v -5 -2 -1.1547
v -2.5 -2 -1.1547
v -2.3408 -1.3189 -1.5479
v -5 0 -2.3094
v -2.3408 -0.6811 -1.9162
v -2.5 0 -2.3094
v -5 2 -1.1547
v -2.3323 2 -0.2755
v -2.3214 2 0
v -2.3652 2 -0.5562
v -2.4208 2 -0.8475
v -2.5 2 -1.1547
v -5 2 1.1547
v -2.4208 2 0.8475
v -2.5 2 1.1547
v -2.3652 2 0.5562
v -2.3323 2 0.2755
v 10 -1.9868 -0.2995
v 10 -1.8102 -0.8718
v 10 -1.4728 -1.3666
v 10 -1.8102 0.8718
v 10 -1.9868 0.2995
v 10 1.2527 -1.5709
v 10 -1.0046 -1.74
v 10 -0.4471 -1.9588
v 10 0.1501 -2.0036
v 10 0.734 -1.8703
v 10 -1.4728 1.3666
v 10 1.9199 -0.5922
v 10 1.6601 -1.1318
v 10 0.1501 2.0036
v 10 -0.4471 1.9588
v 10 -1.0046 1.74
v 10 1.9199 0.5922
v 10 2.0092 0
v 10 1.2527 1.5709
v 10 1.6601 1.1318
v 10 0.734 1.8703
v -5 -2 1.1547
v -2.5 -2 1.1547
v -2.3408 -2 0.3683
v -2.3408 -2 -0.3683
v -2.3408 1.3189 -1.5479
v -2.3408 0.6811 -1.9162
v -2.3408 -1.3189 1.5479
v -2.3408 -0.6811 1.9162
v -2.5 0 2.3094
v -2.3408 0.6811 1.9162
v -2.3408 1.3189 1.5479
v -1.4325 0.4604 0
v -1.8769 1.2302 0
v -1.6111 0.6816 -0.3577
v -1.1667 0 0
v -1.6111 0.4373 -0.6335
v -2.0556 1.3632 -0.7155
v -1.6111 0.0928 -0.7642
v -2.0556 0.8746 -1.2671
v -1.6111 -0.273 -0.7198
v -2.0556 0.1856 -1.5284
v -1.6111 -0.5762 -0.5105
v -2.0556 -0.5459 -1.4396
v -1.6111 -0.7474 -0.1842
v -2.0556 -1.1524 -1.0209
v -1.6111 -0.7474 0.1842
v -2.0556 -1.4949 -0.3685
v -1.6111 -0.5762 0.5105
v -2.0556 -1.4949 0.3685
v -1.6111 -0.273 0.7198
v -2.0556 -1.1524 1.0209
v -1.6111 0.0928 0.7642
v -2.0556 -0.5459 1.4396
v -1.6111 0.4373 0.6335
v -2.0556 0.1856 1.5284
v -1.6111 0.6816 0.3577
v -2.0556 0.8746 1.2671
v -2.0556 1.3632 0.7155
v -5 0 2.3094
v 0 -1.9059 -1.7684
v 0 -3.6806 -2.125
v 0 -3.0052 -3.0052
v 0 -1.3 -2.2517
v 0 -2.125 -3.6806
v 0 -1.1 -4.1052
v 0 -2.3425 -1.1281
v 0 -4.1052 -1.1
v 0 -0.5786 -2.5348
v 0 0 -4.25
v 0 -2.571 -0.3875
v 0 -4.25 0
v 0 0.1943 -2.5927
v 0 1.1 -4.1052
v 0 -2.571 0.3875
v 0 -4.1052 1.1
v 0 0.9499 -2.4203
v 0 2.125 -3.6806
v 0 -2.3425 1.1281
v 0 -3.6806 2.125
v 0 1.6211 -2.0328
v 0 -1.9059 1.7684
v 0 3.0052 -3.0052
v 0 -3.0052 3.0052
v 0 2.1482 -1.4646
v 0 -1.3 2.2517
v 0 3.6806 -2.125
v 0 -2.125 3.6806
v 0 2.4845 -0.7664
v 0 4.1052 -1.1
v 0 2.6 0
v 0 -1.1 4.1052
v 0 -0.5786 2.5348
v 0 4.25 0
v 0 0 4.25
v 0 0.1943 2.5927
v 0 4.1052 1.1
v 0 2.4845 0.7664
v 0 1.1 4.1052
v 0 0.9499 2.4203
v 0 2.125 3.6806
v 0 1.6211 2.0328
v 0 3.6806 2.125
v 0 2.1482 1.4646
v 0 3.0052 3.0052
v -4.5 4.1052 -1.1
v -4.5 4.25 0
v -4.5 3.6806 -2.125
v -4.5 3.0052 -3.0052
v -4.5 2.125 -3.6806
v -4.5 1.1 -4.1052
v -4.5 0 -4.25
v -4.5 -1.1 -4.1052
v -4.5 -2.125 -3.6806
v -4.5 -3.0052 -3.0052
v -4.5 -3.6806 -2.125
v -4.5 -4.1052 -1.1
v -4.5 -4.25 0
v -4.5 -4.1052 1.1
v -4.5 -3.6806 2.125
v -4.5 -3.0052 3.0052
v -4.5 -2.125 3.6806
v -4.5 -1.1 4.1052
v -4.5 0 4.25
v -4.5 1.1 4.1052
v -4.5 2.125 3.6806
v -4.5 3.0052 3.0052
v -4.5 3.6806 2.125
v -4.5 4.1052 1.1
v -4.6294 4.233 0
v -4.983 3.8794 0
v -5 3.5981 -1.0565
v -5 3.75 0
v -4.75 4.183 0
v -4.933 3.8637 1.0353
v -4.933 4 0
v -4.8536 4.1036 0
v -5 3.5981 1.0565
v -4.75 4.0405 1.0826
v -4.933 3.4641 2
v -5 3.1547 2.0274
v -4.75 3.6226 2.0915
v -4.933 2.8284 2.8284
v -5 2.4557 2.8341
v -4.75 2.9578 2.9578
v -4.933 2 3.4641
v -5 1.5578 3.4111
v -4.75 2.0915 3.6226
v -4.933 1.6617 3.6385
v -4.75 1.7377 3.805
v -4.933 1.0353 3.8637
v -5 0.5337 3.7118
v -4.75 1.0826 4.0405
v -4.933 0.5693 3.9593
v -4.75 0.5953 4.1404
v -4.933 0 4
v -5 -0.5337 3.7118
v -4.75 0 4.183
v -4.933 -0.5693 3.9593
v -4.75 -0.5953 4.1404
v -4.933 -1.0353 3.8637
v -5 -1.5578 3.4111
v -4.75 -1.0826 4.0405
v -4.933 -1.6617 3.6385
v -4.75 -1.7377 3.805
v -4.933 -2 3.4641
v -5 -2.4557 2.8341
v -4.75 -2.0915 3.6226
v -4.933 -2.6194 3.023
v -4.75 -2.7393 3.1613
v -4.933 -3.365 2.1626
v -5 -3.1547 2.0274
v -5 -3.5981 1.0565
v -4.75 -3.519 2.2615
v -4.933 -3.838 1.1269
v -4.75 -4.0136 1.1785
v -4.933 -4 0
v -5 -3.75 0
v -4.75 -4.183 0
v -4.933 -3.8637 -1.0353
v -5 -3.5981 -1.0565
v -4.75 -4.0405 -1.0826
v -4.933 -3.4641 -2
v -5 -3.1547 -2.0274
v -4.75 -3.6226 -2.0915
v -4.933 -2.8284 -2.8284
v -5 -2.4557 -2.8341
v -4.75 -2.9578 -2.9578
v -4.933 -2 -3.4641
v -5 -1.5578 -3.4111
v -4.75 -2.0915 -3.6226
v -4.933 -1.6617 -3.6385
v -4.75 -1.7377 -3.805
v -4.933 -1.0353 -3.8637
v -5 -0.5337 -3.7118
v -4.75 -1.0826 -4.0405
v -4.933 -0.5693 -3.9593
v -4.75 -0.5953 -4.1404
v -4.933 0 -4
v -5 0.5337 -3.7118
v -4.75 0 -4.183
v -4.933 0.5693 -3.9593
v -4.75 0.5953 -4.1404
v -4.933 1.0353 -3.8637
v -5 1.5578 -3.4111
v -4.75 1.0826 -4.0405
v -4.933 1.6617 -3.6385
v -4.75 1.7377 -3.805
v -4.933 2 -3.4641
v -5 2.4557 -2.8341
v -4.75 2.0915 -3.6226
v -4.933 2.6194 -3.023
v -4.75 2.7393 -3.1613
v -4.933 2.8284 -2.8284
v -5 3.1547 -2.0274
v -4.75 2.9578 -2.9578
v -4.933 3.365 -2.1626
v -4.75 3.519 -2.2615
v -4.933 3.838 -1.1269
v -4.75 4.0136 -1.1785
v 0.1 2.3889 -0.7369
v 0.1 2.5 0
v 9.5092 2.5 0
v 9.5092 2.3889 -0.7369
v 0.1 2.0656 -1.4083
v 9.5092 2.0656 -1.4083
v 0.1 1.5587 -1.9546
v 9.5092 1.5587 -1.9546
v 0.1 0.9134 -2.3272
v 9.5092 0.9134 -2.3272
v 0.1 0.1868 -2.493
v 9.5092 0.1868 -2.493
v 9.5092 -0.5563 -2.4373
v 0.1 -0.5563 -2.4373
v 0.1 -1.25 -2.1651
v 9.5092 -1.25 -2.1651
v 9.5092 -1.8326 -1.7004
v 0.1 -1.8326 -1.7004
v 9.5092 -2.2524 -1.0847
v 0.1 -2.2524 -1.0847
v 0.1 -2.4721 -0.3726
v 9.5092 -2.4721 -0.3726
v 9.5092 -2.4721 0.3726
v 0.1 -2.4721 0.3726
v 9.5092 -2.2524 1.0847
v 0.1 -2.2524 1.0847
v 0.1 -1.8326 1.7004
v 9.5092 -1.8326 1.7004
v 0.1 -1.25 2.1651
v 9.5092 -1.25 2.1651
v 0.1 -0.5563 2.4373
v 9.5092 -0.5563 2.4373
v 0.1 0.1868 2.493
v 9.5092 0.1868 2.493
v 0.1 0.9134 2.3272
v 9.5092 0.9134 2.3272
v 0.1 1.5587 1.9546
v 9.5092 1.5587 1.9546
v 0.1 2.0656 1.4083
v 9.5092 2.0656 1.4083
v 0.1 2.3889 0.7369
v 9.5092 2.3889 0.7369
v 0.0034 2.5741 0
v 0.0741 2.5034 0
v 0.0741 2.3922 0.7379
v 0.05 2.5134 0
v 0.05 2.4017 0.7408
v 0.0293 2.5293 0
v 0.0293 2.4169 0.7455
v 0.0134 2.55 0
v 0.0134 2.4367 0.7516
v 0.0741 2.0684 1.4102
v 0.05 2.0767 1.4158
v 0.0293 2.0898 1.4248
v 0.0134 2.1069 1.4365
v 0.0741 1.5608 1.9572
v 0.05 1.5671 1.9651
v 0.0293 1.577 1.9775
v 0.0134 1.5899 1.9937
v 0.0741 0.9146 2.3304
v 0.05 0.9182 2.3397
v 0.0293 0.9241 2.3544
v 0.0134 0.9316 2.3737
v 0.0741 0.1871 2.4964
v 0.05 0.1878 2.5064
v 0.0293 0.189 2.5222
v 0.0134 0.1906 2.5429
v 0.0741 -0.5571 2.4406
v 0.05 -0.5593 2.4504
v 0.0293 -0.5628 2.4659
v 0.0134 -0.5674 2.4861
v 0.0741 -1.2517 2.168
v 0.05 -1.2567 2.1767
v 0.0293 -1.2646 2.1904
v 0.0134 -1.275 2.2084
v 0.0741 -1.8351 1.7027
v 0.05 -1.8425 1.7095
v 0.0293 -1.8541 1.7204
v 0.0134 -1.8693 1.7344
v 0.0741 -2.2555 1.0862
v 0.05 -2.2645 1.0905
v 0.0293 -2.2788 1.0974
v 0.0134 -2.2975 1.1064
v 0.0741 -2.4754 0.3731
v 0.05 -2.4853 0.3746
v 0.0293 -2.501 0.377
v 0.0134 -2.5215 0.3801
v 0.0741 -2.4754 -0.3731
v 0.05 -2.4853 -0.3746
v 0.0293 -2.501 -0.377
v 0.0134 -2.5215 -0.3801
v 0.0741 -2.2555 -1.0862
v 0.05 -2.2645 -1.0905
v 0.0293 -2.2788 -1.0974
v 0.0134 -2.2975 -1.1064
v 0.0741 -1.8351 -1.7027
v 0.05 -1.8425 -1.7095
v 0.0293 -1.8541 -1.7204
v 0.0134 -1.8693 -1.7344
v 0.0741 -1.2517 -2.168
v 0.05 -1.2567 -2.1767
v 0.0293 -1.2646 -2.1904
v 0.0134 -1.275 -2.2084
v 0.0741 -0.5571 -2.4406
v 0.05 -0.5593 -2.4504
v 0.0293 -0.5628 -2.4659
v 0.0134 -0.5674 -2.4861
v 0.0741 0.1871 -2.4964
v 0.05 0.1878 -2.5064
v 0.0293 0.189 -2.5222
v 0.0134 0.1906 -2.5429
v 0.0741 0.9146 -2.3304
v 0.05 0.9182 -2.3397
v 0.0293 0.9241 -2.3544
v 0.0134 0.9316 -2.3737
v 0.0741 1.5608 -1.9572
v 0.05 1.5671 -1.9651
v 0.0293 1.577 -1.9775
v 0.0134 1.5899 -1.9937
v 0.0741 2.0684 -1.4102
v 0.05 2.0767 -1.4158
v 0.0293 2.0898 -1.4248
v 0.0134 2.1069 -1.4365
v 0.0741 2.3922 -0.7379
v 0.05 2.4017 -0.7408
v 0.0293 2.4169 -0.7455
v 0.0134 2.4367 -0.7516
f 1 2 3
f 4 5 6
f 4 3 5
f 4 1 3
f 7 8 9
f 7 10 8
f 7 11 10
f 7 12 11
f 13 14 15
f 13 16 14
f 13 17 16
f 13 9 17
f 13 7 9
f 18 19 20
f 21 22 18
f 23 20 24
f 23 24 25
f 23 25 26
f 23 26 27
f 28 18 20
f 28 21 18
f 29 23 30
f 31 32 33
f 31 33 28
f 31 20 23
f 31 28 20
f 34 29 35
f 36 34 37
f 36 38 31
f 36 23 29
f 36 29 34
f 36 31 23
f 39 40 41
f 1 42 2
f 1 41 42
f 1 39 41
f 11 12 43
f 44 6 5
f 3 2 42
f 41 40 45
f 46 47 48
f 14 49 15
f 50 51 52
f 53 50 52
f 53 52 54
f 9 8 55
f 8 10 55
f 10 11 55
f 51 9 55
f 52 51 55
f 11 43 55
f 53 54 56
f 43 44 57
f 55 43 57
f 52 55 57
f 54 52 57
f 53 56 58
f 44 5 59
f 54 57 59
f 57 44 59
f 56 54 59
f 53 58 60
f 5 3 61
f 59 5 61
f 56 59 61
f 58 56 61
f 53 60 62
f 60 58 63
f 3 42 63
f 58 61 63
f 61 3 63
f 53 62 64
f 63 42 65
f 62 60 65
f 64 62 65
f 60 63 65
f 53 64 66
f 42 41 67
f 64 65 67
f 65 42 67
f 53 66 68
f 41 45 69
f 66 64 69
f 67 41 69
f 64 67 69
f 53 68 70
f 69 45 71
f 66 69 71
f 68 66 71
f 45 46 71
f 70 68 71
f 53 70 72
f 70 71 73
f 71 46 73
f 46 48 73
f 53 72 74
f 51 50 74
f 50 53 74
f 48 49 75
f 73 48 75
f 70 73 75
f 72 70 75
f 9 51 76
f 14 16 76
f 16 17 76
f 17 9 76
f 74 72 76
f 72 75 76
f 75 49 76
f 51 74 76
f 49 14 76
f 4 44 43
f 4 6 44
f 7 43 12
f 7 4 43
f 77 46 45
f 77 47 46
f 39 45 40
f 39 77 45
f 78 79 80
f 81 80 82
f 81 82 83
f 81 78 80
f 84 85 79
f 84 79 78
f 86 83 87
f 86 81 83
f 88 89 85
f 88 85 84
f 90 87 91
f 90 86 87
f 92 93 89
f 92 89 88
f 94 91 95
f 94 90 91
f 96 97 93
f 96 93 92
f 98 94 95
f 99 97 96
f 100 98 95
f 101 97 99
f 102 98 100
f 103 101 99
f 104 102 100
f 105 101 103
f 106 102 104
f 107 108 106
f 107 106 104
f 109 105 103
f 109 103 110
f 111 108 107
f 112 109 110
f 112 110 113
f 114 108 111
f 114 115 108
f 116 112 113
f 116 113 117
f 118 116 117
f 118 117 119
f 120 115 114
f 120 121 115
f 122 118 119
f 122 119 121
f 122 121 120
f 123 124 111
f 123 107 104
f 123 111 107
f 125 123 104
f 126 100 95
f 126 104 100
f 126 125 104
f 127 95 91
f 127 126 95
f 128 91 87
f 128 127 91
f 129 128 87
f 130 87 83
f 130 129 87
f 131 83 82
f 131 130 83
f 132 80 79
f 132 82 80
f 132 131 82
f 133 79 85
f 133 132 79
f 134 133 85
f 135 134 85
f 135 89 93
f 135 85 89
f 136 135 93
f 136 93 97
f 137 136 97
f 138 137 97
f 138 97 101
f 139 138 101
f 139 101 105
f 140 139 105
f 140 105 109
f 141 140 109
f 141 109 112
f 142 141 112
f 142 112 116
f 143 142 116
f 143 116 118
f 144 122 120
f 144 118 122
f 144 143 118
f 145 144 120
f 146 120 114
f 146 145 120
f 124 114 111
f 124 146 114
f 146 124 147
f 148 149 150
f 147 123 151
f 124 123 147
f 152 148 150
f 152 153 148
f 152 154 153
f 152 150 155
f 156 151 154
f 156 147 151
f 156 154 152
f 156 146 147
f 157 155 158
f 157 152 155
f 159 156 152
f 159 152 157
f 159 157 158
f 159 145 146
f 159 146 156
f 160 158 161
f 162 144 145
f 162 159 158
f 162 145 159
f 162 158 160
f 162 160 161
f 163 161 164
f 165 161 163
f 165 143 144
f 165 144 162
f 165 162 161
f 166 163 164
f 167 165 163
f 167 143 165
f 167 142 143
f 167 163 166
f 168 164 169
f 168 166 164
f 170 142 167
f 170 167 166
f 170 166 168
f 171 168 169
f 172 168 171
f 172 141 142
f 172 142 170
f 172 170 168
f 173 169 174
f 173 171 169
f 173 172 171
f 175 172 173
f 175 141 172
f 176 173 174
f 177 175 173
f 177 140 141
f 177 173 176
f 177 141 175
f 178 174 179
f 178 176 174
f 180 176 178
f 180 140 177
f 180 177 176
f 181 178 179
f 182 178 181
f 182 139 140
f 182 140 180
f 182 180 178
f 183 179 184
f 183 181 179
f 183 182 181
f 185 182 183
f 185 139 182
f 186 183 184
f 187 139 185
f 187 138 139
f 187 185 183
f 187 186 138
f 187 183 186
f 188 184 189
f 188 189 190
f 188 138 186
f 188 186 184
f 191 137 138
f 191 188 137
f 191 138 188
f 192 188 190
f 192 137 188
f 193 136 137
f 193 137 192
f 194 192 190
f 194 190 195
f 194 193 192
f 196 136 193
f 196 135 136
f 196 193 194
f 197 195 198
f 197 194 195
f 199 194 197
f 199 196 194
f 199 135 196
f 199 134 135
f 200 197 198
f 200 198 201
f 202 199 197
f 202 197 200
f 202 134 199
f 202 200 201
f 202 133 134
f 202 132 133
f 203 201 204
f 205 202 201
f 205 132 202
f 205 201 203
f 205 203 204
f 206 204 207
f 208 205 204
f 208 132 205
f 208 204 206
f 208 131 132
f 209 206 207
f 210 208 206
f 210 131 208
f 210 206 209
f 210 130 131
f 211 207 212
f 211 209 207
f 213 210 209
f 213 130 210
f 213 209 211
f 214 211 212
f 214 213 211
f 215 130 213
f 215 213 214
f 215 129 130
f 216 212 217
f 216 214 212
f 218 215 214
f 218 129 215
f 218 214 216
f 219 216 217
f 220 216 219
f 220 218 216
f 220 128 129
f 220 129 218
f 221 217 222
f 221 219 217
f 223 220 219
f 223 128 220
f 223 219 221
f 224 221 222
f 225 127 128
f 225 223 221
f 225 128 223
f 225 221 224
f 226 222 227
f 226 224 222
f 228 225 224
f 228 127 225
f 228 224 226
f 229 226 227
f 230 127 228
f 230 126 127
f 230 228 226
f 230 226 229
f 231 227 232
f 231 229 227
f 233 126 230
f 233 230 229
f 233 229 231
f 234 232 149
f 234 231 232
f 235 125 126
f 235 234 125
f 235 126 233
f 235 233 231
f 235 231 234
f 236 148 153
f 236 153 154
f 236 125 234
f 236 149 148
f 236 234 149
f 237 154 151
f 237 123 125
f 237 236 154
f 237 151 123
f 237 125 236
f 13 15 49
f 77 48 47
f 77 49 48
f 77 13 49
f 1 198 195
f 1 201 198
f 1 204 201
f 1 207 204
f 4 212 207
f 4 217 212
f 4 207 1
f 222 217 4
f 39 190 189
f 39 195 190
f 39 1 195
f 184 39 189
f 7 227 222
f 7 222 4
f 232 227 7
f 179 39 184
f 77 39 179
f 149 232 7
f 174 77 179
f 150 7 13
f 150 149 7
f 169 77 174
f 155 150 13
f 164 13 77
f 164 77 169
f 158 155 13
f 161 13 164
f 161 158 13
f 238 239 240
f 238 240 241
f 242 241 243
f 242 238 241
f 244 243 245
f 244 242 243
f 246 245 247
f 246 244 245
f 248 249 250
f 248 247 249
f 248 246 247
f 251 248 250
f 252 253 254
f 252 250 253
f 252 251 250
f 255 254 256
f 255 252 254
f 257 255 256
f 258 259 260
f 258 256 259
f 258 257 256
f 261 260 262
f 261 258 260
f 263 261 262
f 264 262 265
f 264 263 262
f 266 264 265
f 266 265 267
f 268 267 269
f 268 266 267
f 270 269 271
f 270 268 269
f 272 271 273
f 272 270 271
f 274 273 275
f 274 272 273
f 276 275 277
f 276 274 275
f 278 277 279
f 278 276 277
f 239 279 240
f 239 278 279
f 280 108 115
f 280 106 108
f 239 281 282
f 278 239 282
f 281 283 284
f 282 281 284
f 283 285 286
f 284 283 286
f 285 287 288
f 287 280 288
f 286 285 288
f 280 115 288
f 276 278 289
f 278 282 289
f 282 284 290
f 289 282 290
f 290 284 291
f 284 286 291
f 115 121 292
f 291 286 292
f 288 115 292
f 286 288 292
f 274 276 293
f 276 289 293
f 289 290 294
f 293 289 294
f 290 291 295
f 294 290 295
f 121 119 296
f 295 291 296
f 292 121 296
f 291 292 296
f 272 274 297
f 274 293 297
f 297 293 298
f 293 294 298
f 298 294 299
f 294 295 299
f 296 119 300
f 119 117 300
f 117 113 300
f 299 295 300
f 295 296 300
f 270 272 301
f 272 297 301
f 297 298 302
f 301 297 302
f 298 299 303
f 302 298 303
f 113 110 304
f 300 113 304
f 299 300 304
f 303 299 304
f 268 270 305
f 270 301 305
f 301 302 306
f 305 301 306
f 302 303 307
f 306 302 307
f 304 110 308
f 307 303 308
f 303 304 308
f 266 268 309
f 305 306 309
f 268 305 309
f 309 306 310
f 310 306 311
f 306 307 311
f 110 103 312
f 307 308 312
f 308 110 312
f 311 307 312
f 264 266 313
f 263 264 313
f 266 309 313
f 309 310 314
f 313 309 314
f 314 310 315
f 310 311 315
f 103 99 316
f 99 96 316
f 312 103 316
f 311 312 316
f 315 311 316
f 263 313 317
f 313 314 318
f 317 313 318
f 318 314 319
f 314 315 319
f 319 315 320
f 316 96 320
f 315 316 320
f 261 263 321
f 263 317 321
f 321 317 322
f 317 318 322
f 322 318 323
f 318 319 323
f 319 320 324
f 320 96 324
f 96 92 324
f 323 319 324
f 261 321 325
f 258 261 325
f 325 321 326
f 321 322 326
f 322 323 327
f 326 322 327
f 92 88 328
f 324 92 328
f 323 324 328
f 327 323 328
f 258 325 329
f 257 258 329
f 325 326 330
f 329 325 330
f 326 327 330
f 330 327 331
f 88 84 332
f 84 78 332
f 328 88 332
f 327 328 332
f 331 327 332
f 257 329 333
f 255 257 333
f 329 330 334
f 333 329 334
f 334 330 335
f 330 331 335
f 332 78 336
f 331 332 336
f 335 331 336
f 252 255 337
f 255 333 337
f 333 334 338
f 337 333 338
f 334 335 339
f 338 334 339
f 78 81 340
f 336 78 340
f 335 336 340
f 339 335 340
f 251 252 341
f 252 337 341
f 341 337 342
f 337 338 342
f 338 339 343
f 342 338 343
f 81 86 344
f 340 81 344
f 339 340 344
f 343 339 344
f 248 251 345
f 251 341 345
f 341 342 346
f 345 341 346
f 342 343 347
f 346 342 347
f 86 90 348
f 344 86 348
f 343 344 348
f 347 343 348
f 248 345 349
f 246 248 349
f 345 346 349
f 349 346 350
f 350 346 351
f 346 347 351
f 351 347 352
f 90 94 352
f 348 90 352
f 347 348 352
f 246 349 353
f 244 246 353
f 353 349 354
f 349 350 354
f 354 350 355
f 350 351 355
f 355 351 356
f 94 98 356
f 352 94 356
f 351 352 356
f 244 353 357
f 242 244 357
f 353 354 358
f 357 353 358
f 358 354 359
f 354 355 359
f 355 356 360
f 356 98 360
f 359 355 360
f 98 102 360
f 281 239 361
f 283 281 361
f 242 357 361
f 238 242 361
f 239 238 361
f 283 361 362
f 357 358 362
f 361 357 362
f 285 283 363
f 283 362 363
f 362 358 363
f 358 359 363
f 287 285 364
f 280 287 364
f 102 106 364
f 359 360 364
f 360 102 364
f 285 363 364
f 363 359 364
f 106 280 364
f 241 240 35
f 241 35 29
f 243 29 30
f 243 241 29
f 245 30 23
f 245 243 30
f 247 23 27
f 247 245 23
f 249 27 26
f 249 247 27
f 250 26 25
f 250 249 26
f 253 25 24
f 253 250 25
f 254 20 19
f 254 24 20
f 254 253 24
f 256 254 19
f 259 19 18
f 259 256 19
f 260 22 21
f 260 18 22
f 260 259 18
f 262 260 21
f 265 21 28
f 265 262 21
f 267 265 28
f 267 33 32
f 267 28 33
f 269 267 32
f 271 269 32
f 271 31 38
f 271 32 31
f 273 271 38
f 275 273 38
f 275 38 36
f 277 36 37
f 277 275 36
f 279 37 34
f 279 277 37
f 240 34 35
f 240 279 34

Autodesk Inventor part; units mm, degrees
ref_plane "YZ Plane" through (0, 0, 0) normal (1, 0, 0) x (0, 1, 0)
ref_plane "XZ Plane" through (0, 0, 0) normal (0, 1, 0) x (-1, 0, 0)
sketch "Szkic1" plane through (0, 0, 0) normal (0, 0, 1) x (1, 0, 0)
  line L0 (-1.1667, 0) -> (10, 0)
  line L1 (10, 0) -> (10, 2.5)
  line L2 (10, 2.5) -> (2, 2.5)
  line L3 (2, 2.5) -> (1.5091, 2.5)
  line L4 (1.5091, 2.5) -> (0, 2.5)
  line L5 (0, 2.5) -> (0, 4.25)
  line L6 (0, 4.25) -> (-5, 4.25)
  line L7 (-5, 4.25) -> (-5, 2.3094)
  line L8 (-5, 2.3094) -> (-2.5, 2.3094)
  line L9 (-2.5, 2.3094) -> (-1.1667, 0)
  line L10 (-8, 0) -> (13, 0) projected
  line L11 (0, -0.85) -> (0, 5.1) projected
  line L12 (2, 2.5) -> (0, 2.5) construction
  dimension "d1" = 8
  dimension "d2" = 0.4909
  dimension "d3" = 5
  dimension "d4" = 2.5
  dimension "d5" = 60
  dimension "d6" = 5
  dimension "d7" = 5
  dimension "d8" = 4.6188
  dimension "d9" = 8.5
  dimension "d26" = 10
revolve "Bryła" add sketch "Szkic1" angle 360 about axis through (-1.1667, 0, 0) along (1, 0, 0)
sketch "Szkic2" plane through (-5, 0, 0) normal (-1, 0, 0) x (0, 0, 1)
  circle A0 centre (0, 0) radius 2.3094 projected
  line L0 (0, -5.95) -> (0, 5.95) projected
  line L1 (-5.95, 0) -> (5.95, 0) projected
  line L2 (2.3094, 0) -> (1.1547, -2)
  line L3 (1.1547, -2) -> (-1.1547, -2)
  line L4 (-1.1547, -2) -> (-2.3094, 0)
  line L5 (-2.3094, 0) -> (-1.1547, 2)
  line L6 (-1.1547, 2) -> (1.1547, 2)
  line L7 (1.1547, 2) -> (2.3094, 0)
extrude "Szczelina" add sketch "Szkic2" against normal up to next contours L7 A0 | A0 L2 | L6 L0 A0 | A0 L0 L3 | L0 L6 A0 | A0 L3 L0 | L4 A0 | A0 L5
fillet "Zaokrąglenie1" radius 0.5 1 edges at (-5, -4.25, 0)
thread "Gwint" size "M5x0.8" class "6g" standard "ISO Metric profile" length 8
chamfer "Faza1" distance 0.4908 distance2 0.4908 1 edges at (10, -2.5, 0) measured on face at (10, -0.7741, -0.6858)
ref_plane "Work Plane1" through (29, 0, 0) normal (0, -1, 0) x (1, 0, 0)
fillet "Fillet2" radius 0.1 1 edges at (0, -2.5, 0)
equation "\"d1\" = GEL"
equation "\"d3\" = KOH"
equation "\"d4\" = INTI"
equation "\"d6\" = GD"
equation "\"d7\" = BDM"
equation "\"d8\" = 1.1547 * SW"
equation "\"d9\" = KOD"
equation "\"d26\" = NLG"
equation "\"d30\" = R"
equation "\"d17\" = RR"
equation "\"d13\" = GEL"
equation "\"d15\" = -0.5 * SPD + 0.5 * GD"
equation "\"d16\" = GUL"
equation "\"GD\" = NND"
equation "\"NLG\" = 10"
equation "\"GEL\" = 8"
equation "\"KOD\" = 8.5"
equation "\"KOH\" = NND"
equation "\"INTI\" = 2.5"
equation "\"GAL\" = 0.61345 * PTC"
equation "\"GUL\" = 0.61345 * PTC"
equation "\"BDM\" = NND"
equation "\"SW\" = 4"
equation "\"RR\" = 0.1 * NND"
equation "\"SPD\" = NND - 1.2269 * PTC"
equation "\"R\" = 0.1"
equation "\"PHH\" = 0.13"
equation "\"GD1\" = THREADDIA - 1.2269 * PTC"
equation "\"THREADDIA\" = 5"
equation "\"FAWI\" = 45deg"
equation "\"PTC\" = 0.8"
equation "\"KOH1\" = 4.5"
equation "\"NND\" = 5"
equation "\"TOA\" = 30deg"
equation "\"E0\" = 1.155 * SW"
properties part number "AS 1420 - 1973 - M5 x 10" material "Stal, miękka"
